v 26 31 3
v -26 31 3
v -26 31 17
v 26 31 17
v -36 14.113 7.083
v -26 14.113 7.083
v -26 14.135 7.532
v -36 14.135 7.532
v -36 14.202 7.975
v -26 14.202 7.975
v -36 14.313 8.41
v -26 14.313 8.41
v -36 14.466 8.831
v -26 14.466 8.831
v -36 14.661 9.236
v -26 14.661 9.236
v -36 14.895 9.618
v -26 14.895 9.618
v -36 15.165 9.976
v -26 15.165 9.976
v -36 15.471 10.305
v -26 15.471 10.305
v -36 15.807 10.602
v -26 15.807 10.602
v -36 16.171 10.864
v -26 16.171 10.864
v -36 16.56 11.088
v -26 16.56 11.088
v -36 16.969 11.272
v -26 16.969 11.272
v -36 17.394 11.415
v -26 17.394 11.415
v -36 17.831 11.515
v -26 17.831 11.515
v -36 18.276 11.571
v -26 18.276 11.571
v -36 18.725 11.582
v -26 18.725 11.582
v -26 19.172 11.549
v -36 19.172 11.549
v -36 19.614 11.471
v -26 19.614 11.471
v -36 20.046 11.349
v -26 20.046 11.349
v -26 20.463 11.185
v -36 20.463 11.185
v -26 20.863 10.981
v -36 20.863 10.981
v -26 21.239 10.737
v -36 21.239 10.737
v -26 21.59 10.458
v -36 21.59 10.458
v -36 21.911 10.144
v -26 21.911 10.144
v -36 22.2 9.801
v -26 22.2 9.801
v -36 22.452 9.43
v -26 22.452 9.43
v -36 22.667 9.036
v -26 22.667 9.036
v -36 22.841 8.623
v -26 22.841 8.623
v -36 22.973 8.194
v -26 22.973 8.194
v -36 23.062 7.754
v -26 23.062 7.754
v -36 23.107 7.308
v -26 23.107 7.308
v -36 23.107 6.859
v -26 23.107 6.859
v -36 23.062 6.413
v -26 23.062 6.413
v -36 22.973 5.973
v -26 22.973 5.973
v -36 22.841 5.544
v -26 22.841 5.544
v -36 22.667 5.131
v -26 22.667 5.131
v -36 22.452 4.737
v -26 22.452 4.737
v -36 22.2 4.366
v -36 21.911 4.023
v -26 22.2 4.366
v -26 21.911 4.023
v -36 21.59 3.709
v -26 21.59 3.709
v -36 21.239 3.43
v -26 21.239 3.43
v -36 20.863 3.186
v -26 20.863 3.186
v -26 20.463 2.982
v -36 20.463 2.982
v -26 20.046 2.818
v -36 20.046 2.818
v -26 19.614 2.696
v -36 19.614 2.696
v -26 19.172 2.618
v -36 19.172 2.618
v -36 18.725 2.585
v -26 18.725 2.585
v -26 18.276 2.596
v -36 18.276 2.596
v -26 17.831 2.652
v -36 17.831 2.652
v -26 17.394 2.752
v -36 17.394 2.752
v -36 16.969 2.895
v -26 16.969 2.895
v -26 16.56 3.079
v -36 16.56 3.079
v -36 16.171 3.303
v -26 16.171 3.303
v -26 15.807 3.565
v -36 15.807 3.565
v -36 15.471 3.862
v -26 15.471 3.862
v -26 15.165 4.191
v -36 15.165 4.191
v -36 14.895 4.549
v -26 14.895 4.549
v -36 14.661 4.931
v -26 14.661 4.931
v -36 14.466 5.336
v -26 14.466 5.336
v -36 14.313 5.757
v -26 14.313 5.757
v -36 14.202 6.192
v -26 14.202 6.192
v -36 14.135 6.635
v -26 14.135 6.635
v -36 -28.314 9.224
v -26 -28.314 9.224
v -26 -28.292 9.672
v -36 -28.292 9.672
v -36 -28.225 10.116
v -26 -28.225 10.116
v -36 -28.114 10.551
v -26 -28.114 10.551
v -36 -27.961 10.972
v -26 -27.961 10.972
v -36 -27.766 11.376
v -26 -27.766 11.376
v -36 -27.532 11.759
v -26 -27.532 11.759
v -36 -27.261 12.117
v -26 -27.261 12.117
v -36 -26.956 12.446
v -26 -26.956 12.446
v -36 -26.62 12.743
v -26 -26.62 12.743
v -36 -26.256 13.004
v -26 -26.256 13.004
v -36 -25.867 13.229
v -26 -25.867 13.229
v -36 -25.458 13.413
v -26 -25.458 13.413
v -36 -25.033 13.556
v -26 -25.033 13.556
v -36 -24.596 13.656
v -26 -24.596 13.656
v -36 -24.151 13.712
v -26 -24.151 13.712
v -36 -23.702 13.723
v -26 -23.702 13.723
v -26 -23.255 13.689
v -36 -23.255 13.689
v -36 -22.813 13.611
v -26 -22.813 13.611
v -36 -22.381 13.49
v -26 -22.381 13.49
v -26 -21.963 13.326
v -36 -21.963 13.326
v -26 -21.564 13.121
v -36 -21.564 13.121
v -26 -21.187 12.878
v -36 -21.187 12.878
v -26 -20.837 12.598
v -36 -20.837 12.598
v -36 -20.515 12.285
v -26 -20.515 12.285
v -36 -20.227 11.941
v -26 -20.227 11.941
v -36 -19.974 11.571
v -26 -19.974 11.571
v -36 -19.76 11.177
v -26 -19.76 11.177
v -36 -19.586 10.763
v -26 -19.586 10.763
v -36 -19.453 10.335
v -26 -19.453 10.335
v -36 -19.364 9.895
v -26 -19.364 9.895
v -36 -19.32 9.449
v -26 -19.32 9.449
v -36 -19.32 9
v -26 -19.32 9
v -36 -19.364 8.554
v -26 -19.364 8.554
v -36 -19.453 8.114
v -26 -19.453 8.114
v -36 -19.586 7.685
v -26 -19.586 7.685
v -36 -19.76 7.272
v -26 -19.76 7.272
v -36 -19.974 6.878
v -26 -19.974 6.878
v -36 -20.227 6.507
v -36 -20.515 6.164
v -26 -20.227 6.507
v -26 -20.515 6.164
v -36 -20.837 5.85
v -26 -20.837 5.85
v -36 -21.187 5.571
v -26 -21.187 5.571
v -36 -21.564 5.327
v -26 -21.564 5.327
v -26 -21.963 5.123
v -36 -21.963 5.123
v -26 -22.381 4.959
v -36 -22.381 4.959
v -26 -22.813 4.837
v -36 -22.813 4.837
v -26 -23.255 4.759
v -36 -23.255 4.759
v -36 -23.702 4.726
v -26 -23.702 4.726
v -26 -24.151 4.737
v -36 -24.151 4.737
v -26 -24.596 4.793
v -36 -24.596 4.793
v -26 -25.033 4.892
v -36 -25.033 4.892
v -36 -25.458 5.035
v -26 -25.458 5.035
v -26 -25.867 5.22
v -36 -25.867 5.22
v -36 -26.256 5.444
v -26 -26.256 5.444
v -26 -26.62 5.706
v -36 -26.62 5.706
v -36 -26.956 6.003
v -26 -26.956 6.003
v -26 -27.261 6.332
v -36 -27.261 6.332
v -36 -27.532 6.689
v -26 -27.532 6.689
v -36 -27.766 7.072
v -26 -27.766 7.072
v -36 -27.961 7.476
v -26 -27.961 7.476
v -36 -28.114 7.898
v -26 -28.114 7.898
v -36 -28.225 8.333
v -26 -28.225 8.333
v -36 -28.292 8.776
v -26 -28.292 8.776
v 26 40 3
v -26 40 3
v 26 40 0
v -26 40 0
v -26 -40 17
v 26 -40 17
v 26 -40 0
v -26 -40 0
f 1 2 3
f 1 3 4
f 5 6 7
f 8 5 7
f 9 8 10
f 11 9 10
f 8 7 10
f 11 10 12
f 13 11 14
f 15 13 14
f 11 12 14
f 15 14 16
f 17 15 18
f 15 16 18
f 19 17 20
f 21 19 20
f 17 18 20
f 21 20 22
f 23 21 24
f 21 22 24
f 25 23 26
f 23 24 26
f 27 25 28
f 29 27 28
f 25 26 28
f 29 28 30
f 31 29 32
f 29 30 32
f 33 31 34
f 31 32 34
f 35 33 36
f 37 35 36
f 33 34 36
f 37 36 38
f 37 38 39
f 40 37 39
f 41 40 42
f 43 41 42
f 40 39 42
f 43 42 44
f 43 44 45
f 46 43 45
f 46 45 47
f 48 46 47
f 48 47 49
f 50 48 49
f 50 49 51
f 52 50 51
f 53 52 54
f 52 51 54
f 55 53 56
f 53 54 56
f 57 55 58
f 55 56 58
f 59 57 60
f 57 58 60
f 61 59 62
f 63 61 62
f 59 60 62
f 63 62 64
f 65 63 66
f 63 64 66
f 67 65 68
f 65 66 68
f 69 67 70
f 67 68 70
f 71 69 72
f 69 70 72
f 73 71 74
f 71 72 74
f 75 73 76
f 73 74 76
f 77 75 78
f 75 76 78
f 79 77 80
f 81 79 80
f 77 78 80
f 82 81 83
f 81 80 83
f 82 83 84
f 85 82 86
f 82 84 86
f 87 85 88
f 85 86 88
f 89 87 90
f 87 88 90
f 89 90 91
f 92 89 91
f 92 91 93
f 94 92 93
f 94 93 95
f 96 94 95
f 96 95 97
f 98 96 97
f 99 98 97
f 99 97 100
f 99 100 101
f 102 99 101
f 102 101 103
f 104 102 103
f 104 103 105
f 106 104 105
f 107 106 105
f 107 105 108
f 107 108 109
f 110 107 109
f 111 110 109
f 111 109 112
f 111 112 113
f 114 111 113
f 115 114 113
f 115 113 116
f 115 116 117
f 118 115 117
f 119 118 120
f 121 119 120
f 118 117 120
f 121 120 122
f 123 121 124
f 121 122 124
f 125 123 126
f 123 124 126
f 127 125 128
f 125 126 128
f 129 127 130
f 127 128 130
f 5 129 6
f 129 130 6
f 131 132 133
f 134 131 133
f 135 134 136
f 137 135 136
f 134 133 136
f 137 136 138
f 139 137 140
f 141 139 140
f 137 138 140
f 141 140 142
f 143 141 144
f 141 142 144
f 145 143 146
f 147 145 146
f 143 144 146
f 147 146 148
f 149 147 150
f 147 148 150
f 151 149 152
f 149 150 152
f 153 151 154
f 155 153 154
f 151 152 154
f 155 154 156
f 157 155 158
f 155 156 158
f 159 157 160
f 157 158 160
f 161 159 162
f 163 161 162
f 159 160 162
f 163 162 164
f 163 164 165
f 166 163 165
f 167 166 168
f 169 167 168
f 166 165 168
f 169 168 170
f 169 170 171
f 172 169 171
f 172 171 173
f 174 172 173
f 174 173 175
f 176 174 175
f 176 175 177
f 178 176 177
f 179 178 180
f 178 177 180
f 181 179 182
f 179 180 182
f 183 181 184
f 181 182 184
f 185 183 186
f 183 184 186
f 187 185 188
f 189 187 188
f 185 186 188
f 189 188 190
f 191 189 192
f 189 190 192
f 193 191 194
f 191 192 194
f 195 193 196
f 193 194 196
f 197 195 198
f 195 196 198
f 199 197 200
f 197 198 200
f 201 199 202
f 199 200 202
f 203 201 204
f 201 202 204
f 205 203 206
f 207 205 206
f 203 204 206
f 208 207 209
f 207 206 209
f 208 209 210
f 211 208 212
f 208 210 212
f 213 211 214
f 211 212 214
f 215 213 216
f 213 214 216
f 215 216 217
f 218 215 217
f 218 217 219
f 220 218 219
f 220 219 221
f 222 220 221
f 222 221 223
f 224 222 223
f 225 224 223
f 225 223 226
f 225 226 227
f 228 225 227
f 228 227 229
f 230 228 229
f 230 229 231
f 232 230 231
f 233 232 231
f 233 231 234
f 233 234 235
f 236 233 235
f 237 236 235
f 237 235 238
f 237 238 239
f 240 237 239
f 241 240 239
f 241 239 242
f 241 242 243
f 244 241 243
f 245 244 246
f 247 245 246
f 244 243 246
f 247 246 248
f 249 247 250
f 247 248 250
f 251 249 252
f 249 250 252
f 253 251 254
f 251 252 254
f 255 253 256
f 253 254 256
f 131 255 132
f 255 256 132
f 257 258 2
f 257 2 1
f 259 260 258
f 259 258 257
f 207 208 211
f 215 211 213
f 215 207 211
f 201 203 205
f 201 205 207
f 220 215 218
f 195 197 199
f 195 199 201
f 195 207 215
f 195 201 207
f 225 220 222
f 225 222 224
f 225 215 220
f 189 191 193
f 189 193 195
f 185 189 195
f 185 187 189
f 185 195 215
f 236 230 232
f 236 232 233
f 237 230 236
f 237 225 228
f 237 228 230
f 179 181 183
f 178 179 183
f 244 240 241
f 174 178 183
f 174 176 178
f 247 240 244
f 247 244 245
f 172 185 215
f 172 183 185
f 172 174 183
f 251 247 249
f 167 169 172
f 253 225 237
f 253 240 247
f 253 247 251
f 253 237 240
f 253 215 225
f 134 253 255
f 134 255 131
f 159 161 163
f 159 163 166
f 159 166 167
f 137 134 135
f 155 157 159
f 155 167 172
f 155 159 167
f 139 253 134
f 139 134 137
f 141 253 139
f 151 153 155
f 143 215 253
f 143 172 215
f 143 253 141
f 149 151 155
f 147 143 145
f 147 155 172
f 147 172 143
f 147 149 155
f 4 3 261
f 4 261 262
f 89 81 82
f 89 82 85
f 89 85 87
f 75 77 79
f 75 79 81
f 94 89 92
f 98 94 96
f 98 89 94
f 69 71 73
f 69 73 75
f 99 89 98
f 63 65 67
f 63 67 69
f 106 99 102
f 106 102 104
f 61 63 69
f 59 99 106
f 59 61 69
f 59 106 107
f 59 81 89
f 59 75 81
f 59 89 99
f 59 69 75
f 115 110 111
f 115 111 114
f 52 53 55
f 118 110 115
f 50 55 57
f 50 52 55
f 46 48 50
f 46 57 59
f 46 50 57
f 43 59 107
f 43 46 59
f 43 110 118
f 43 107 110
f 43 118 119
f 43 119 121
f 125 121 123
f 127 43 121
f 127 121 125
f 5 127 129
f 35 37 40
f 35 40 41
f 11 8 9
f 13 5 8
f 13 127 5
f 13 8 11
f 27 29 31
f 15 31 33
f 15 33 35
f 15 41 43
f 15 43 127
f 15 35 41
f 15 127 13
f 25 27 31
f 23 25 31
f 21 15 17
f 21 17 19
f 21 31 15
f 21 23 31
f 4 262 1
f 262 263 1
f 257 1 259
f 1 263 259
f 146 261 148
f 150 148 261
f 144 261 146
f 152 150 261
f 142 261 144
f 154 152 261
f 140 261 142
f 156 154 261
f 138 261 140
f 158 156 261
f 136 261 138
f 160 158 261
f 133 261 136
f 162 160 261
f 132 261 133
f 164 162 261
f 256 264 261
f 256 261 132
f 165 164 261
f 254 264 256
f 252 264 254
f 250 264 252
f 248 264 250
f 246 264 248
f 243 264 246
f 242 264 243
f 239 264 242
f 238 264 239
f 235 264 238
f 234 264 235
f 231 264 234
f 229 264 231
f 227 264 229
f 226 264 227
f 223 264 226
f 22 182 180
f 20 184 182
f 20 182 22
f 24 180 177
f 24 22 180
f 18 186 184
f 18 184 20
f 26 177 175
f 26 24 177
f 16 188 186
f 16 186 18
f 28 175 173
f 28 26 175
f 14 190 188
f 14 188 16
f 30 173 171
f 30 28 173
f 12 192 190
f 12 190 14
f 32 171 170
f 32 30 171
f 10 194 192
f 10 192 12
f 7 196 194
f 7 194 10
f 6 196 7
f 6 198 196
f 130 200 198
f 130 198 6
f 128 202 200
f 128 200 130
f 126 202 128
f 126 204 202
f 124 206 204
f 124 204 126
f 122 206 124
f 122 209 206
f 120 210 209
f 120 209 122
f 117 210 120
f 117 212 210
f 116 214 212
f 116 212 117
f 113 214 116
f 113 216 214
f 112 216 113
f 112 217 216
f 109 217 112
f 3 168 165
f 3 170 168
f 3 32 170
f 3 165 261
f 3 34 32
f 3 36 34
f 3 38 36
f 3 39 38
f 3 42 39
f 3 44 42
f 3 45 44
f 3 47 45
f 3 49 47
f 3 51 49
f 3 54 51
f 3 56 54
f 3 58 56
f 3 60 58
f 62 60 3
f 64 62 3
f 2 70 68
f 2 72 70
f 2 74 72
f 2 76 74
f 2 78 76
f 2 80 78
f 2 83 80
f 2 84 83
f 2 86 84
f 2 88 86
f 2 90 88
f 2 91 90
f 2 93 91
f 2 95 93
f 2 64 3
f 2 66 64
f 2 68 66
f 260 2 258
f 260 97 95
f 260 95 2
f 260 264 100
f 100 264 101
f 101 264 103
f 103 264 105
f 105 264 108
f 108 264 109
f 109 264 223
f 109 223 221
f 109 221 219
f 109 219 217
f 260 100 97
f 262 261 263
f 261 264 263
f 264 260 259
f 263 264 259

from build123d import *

# Parameters (mm, degrees)
F0_W     = 52
F0_H     = 80
F1_DEPTH = 3
F2_W     = 52
F2_H     = 71
F3_DEPTH = 14
F4_R     = 4.5
F5_DEPTH = 10


with BuildPart() as f1:
    # F0 (on Top) → F1 (new body)
    with BuildSketch(Plane.XY):
        Rectangle(F0_W, F0_H)
    extrude(amount=F1_DEPTH)

    # F2 (on face) → F3 (join)
    with BuildSketch(Plane.XY.offset(3)):
        with Locations((0, -4.5)):
            Rectangle(F2_W, F2_H)
    extrude(amount=F3_DEPTH)

    # F4 (on face) → F5 (join)
    with BuildSketch(Plane(origin=(-26, 0, 0), x_dir=(0, -1, 0), z_dir=(-1, 0, 0))):
        with Locations((23.814216, 9.224292)):
            Circle(F4_R)
        with Locations((-18.612601, 7.083489)):
            Circle(F4_R)
    extrude(amount=F5_DEPTH)


solid = f1.part
